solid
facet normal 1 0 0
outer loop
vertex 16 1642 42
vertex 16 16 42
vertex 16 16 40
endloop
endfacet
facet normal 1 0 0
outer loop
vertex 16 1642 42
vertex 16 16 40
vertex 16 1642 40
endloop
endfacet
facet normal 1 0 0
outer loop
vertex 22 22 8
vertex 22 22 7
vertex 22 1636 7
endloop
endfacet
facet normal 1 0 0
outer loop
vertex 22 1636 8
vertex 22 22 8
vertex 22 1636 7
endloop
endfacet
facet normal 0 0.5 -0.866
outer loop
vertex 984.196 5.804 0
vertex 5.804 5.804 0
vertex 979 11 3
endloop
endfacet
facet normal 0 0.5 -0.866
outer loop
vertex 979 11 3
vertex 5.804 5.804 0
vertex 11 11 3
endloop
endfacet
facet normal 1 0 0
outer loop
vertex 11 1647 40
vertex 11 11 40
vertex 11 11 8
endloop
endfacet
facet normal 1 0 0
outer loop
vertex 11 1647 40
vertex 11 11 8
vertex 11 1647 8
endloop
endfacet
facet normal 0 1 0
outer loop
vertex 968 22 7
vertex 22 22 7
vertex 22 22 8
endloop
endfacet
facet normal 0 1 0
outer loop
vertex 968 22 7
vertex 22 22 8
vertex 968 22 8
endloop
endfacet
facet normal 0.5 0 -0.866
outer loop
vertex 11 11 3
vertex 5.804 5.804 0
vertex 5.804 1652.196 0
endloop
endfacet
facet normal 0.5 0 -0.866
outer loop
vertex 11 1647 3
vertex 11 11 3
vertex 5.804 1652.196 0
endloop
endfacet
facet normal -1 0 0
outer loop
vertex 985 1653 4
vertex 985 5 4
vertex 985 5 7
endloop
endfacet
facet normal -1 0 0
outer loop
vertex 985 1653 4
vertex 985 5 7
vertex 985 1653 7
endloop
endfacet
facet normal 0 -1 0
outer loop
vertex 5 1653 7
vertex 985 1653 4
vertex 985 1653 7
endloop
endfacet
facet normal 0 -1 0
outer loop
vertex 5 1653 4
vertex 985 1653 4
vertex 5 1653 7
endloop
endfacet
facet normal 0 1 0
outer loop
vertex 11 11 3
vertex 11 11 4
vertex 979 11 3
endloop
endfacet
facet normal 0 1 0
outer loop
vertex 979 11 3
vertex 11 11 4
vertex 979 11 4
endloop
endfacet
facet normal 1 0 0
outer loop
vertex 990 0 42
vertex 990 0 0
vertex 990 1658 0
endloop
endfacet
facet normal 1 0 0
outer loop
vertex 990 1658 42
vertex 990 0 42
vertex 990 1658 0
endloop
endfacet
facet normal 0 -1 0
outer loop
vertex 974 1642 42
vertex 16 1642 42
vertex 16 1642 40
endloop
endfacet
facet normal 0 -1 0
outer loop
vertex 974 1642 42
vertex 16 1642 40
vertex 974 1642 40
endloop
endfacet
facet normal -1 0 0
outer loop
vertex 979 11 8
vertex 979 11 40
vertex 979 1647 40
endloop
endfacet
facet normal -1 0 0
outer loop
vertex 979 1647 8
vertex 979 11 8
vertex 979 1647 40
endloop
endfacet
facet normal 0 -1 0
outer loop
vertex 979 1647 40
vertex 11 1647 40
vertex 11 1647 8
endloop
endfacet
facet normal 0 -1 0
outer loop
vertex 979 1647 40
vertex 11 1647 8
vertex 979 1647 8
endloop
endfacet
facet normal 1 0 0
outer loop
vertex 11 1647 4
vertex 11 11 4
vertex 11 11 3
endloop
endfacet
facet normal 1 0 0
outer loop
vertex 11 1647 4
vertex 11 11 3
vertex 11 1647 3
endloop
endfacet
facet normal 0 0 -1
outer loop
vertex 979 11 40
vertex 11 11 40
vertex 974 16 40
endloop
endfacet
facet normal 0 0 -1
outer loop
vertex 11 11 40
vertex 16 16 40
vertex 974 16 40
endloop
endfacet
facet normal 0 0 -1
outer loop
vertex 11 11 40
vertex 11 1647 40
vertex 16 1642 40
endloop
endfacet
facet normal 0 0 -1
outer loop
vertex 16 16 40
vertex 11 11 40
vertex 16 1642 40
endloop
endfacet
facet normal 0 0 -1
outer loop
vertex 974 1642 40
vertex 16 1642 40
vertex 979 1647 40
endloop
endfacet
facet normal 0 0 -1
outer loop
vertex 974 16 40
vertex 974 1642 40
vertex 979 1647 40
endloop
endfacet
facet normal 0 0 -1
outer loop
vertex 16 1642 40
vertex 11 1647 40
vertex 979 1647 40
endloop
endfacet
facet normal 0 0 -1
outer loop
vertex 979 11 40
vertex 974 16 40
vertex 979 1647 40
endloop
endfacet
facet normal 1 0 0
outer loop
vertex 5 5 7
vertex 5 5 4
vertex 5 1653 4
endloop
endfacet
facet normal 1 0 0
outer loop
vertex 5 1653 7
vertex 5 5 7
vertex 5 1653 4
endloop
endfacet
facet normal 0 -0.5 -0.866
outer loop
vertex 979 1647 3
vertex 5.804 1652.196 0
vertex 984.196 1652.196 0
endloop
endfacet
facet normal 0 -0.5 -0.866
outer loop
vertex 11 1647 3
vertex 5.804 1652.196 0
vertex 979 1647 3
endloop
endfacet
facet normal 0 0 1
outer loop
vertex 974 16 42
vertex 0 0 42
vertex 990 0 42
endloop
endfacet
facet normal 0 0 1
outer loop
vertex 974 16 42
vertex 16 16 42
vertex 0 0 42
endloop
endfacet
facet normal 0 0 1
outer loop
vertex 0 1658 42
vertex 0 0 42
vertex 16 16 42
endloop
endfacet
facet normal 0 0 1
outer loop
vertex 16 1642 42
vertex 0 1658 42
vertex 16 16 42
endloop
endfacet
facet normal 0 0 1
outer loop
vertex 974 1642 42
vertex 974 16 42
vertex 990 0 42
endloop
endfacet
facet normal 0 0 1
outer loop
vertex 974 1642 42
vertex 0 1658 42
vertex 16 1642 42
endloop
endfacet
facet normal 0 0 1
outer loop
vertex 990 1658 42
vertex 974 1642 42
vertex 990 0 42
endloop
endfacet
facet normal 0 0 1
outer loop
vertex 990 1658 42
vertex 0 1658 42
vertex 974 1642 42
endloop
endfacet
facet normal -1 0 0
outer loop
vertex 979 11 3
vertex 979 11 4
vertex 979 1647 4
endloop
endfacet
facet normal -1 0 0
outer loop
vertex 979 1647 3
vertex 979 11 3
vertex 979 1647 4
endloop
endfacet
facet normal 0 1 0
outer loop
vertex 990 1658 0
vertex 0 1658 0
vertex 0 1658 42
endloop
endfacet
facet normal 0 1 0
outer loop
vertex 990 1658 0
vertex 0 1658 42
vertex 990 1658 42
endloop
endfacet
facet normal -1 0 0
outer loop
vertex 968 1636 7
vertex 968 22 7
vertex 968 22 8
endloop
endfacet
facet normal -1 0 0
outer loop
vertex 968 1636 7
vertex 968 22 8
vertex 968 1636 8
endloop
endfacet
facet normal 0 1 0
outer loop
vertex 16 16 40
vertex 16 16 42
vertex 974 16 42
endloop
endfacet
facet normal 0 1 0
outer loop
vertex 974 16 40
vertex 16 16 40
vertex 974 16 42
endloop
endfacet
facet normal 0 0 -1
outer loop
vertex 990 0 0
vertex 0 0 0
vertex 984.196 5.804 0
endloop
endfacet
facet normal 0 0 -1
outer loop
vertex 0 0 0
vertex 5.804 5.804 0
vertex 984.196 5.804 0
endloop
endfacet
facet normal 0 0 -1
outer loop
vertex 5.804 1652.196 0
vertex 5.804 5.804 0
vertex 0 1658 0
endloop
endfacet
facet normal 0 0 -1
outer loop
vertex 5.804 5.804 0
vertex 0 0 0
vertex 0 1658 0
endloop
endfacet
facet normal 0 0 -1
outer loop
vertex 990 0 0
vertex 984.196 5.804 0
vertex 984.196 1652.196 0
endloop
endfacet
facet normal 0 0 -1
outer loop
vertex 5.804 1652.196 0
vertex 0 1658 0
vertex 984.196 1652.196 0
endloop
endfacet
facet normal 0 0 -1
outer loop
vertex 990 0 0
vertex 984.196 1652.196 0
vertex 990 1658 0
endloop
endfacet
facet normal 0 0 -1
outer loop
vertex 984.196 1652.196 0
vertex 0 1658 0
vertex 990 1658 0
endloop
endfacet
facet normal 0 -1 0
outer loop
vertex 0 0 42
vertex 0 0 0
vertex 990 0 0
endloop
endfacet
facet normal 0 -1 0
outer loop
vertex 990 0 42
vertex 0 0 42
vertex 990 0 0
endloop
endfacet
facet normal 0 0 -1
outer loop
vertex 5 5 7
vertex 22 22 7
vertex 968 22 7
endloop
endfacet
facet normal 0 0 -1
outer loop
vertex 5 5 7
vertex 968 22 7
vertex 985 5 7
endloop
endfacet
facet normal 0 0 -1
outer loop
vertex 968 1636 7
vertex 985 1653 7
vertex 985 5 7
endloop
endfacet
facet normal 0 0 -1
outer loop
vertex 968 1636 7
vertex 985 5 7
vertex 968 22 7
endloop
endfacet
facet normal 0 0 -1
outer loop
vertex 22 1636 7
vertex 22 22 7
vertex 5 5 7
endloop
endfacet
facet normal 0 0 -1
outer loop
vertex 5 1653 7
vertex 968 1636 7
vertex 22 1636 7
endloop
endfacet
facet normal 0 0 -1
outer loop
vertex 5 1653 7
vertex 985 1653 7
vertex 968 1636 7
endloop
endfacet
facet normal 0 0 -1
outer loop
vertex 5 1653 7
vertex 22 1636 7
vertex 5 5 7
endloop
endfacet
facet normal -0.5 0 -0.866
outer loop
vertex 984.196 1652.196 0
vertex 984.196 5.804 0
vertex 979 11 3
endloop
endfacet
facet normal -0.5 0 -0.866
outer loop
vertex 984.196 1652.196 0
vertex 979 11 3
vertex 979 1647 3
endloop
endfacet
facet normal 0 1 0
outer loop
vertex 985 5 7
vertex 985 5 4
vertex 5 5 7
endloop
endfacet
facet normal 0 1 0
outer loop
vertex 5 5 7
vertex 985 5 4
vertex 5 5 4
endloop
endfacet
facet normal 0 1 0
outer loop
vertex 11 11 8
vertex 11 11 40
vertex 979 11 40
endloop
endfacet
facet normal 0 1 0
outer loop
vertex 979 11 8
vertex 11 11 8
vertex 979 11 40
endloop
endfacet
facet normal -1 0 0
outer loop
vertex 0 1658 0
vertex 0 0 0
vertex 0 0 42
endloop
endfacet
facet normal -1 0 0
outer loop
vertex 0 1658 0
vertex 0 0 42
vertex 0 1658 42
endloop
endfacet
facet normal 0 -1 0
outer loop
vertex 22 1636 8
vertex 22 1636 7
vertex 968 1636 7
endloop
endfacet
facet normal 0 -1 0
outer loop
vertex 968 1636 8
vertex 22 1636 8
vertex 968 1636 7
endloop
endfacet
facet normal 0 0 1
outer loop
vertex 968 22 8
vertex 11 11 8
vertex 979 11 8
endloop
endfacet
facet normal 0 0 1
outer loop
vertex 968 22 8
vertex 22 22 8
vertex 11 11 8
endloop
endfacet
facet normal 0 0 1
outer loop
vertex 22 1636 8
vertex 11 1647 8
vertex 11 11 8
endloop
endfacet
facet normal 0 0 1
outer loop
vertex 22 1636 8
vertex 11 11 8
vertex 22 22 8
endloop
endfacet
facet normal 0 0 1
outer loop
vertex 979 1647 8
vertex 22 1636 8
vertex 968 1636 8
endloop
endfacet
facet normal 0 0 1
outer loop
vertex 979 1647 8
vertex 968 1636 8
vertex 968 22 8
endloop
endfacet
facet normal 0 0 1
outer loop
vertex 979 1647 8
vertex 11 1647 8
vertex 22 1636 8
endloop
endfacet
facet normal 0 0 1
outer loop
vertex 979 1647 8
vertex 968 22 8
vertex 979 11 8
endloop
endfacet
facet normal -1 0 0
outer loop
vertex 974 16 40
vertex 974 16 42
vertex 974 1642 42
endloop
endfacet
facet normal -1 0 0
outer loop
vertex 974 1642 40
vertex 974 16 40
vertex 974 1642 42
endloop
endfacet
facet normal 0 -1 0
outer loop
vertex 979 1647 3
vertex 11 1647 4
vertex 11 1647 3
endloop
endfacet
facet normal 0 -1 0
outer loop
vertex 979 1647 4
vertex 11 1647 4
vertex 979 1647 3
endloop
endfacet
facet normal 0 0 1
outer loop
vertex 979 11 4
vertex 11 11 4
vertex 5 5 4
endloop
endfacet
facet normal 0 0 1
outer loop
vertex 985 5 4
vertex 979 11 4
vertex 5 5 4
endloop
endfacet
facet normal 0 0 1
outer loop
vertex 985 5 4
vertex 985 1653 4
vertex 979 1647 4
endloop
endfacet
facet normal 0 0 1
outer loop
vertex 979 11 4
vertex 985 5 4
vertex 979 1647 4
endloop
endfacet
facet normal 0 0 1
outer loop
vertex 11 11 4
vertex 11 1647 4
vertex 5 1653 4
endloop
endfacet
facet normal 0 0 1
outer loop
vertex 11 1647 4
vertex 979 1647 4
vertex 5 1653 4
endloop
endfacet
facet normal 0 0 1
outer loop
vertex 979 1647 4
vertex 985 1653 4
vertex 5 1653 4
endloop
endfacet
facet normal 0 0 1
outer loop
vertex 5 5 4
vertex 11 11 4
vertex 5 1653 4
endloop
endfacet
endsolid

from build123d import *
from OCP.BRepFilletAPI import BRepFilletAPI_MakeChamfer

# Parameters (mm, degrees)
SKETCH1_W           = 990
SKETCH1_H           = 1658
BOSS_EXTRUDE1_DEPTH = 42
SKETCH2_W           = 958
SKETCH2_H           = 1626
CUT_EXTRUDE1_DEPTH  = 2
SKETCH3_W           = 968
SKETCH3_H           = 1636
CUT_EXTRUDE2_DEPTH  = 1932.492687017
SKETCH4_W           = 968
SKETCH4_H           = 1636
SKETCH4_W_2         = 946
SKETCH4_H_2         = 1614
BOSS_EXTRUDE2_DEPTH = 1
CUT_EXTRUDE3_START  = -4
SKETCH5_W           = 980
SKETCH5_H           = 1648
CUT_EXTRUDE3_DEPTH  = 3
CHAMFER1_SIZE       = 3
CHAMFER1_SIZE2      = 5.196152423


with BuildPart() as part:
    # Sketch1 → Boss-Extrude1 (new body)
    with BuildSketch(Plane.XY):
        with Locations((495, 829)):
            Rectangle(SKETCH1_W, SKETCH1_H)
    extrude(amount=BOSS_EXTRUDE1_DEPTH)

    # Sketch2 → Cut-Extrude1 (cut)
    with BuildSketch(Plane.XY.offset(42)):
        with Locations((495, 829)):
            Rectangle(SKETCH2_W, SKETCH2_H)
    extrude(amount=-CUT_EXTRUDE1_DEPTH, mode=Mode.SUBTRACT)

    # Sketch3 → Cut-Extrude2 (cut, through all)
    with BuildSketch(Plane.XY.offset(40)):
        with Locations((495, 829)):
            Rectangle(SKETCH3_W, SKETCH3_H)
    extrude(amount=-CUT_EXTRUDE2_DEPTH, mode=Mode.SUBTRACT)

    # Sketch4 → Boss-Extrude2 (add)
    with BuildSketch(Plane.XY.offset(7)):
        with Locations((495, 829)):
            Rectangle(SKETCH4_W, SKETCH4_H)
        with Locations((495, 829)):
            Rectangle(SKETCH4_W_2, SKETCH4_H_2, mode=Mode.SUBTRACT)
    extrude(amount=BOSS_EXTRUDE2_DEPTH)

    # Sketch5 → Cut-Extrude3 (cut)
    with BuildSketch(Plane(origin=(0, 0, 0), x_dir=(-1, 0, 0), z_dir=(0, 0, -1)).offset(CUT_EXTRUDE3_START)):
        with Locations((-495, 829)):
            Rectangle(SKETCH5_W, SKETCH5_H)
    extrude(amount=-CUT_EXTRUDE3_DEPTH, mode=Mode.SUBTRACT)

    # Chamfer1: one chamfer whose edges measure the first distance from different faces: ONE call of the kernel's chamfer builder (chamfer() names one face for all edges)
    chamfer1_edges_1 = [part.edges().sort_by_distance(p)[0] for p in [
        (495, 1647, 0),
    ]]
    chamfer1_side_1 = [part.faces().sort_by_distance(p)[0] for p in [
        (495, 1647, 2),
    ]]
    chamfer1_edges_2 = [part.edges().sort_by_distance(p)[0] for p in [
        (979, 829, 0),
    ]]
    chamfer1_side_2 = [part.faces().sort_by_distance(p)[0] for p in [
        (979, 829, 2),
    ]]
    chamfer1_edges_3 = [part.edges().sort_by_distance(p)[0] for p in [
        (495, 11, 0),
    ]]
    chamfer1_side_3 = [part.faces().sort_by_distance(p)[0] for p in [
        (495, 11, 2),
    ]]
    chamfer1_edges_4 = [part.edges().sort_by_distance(p)[0] for p in [
        (11, 829, 0),
    ]]
    chamfer1_side_4 = [part.faces().sort_by_distance(p)[0] for p in [
        (11, 829, 2),
    ]]
    chamfer1 = BRepFilletAPI_MakeChamfer(part.part.solid().wrapped)
    for e in chamfer1_edges_1:
        chamfer1.Add(CHAMFER1_SIZE, CHAMFER1_SIZE2, e.wrapped, chamfer1_side_1[0].wrapped)  # the first distance lies on this face
    for e in chamfer1_edges_2:
        chamfer1.Add(CHAMFER1_SIZE, CHAMFER1_SIZE2, e.wrapped, chamfer1_side_2[0].wrapped)  # the first distance lies on this face
    for e in chamfer1_edges_3:
        chamfer1.Add(CHAMFER1_SIZE, CHAMFER1_SIZE2, e.wrapped, chamfer1_side_3[0].wrapped)  # the first distance lies on this face
    for e in chamfer1_edges_4:
        chamfer1.Add(CHAMFER1_SIZE, CHAMFER1_SIZE2, e.wrapped, chamfer1_side_4[0].wrapped)  # the first distance lies on this face
    add(Compound.cast(chamfer1.Shape()), mode=Mode.REPLACE)


solid = part.part
